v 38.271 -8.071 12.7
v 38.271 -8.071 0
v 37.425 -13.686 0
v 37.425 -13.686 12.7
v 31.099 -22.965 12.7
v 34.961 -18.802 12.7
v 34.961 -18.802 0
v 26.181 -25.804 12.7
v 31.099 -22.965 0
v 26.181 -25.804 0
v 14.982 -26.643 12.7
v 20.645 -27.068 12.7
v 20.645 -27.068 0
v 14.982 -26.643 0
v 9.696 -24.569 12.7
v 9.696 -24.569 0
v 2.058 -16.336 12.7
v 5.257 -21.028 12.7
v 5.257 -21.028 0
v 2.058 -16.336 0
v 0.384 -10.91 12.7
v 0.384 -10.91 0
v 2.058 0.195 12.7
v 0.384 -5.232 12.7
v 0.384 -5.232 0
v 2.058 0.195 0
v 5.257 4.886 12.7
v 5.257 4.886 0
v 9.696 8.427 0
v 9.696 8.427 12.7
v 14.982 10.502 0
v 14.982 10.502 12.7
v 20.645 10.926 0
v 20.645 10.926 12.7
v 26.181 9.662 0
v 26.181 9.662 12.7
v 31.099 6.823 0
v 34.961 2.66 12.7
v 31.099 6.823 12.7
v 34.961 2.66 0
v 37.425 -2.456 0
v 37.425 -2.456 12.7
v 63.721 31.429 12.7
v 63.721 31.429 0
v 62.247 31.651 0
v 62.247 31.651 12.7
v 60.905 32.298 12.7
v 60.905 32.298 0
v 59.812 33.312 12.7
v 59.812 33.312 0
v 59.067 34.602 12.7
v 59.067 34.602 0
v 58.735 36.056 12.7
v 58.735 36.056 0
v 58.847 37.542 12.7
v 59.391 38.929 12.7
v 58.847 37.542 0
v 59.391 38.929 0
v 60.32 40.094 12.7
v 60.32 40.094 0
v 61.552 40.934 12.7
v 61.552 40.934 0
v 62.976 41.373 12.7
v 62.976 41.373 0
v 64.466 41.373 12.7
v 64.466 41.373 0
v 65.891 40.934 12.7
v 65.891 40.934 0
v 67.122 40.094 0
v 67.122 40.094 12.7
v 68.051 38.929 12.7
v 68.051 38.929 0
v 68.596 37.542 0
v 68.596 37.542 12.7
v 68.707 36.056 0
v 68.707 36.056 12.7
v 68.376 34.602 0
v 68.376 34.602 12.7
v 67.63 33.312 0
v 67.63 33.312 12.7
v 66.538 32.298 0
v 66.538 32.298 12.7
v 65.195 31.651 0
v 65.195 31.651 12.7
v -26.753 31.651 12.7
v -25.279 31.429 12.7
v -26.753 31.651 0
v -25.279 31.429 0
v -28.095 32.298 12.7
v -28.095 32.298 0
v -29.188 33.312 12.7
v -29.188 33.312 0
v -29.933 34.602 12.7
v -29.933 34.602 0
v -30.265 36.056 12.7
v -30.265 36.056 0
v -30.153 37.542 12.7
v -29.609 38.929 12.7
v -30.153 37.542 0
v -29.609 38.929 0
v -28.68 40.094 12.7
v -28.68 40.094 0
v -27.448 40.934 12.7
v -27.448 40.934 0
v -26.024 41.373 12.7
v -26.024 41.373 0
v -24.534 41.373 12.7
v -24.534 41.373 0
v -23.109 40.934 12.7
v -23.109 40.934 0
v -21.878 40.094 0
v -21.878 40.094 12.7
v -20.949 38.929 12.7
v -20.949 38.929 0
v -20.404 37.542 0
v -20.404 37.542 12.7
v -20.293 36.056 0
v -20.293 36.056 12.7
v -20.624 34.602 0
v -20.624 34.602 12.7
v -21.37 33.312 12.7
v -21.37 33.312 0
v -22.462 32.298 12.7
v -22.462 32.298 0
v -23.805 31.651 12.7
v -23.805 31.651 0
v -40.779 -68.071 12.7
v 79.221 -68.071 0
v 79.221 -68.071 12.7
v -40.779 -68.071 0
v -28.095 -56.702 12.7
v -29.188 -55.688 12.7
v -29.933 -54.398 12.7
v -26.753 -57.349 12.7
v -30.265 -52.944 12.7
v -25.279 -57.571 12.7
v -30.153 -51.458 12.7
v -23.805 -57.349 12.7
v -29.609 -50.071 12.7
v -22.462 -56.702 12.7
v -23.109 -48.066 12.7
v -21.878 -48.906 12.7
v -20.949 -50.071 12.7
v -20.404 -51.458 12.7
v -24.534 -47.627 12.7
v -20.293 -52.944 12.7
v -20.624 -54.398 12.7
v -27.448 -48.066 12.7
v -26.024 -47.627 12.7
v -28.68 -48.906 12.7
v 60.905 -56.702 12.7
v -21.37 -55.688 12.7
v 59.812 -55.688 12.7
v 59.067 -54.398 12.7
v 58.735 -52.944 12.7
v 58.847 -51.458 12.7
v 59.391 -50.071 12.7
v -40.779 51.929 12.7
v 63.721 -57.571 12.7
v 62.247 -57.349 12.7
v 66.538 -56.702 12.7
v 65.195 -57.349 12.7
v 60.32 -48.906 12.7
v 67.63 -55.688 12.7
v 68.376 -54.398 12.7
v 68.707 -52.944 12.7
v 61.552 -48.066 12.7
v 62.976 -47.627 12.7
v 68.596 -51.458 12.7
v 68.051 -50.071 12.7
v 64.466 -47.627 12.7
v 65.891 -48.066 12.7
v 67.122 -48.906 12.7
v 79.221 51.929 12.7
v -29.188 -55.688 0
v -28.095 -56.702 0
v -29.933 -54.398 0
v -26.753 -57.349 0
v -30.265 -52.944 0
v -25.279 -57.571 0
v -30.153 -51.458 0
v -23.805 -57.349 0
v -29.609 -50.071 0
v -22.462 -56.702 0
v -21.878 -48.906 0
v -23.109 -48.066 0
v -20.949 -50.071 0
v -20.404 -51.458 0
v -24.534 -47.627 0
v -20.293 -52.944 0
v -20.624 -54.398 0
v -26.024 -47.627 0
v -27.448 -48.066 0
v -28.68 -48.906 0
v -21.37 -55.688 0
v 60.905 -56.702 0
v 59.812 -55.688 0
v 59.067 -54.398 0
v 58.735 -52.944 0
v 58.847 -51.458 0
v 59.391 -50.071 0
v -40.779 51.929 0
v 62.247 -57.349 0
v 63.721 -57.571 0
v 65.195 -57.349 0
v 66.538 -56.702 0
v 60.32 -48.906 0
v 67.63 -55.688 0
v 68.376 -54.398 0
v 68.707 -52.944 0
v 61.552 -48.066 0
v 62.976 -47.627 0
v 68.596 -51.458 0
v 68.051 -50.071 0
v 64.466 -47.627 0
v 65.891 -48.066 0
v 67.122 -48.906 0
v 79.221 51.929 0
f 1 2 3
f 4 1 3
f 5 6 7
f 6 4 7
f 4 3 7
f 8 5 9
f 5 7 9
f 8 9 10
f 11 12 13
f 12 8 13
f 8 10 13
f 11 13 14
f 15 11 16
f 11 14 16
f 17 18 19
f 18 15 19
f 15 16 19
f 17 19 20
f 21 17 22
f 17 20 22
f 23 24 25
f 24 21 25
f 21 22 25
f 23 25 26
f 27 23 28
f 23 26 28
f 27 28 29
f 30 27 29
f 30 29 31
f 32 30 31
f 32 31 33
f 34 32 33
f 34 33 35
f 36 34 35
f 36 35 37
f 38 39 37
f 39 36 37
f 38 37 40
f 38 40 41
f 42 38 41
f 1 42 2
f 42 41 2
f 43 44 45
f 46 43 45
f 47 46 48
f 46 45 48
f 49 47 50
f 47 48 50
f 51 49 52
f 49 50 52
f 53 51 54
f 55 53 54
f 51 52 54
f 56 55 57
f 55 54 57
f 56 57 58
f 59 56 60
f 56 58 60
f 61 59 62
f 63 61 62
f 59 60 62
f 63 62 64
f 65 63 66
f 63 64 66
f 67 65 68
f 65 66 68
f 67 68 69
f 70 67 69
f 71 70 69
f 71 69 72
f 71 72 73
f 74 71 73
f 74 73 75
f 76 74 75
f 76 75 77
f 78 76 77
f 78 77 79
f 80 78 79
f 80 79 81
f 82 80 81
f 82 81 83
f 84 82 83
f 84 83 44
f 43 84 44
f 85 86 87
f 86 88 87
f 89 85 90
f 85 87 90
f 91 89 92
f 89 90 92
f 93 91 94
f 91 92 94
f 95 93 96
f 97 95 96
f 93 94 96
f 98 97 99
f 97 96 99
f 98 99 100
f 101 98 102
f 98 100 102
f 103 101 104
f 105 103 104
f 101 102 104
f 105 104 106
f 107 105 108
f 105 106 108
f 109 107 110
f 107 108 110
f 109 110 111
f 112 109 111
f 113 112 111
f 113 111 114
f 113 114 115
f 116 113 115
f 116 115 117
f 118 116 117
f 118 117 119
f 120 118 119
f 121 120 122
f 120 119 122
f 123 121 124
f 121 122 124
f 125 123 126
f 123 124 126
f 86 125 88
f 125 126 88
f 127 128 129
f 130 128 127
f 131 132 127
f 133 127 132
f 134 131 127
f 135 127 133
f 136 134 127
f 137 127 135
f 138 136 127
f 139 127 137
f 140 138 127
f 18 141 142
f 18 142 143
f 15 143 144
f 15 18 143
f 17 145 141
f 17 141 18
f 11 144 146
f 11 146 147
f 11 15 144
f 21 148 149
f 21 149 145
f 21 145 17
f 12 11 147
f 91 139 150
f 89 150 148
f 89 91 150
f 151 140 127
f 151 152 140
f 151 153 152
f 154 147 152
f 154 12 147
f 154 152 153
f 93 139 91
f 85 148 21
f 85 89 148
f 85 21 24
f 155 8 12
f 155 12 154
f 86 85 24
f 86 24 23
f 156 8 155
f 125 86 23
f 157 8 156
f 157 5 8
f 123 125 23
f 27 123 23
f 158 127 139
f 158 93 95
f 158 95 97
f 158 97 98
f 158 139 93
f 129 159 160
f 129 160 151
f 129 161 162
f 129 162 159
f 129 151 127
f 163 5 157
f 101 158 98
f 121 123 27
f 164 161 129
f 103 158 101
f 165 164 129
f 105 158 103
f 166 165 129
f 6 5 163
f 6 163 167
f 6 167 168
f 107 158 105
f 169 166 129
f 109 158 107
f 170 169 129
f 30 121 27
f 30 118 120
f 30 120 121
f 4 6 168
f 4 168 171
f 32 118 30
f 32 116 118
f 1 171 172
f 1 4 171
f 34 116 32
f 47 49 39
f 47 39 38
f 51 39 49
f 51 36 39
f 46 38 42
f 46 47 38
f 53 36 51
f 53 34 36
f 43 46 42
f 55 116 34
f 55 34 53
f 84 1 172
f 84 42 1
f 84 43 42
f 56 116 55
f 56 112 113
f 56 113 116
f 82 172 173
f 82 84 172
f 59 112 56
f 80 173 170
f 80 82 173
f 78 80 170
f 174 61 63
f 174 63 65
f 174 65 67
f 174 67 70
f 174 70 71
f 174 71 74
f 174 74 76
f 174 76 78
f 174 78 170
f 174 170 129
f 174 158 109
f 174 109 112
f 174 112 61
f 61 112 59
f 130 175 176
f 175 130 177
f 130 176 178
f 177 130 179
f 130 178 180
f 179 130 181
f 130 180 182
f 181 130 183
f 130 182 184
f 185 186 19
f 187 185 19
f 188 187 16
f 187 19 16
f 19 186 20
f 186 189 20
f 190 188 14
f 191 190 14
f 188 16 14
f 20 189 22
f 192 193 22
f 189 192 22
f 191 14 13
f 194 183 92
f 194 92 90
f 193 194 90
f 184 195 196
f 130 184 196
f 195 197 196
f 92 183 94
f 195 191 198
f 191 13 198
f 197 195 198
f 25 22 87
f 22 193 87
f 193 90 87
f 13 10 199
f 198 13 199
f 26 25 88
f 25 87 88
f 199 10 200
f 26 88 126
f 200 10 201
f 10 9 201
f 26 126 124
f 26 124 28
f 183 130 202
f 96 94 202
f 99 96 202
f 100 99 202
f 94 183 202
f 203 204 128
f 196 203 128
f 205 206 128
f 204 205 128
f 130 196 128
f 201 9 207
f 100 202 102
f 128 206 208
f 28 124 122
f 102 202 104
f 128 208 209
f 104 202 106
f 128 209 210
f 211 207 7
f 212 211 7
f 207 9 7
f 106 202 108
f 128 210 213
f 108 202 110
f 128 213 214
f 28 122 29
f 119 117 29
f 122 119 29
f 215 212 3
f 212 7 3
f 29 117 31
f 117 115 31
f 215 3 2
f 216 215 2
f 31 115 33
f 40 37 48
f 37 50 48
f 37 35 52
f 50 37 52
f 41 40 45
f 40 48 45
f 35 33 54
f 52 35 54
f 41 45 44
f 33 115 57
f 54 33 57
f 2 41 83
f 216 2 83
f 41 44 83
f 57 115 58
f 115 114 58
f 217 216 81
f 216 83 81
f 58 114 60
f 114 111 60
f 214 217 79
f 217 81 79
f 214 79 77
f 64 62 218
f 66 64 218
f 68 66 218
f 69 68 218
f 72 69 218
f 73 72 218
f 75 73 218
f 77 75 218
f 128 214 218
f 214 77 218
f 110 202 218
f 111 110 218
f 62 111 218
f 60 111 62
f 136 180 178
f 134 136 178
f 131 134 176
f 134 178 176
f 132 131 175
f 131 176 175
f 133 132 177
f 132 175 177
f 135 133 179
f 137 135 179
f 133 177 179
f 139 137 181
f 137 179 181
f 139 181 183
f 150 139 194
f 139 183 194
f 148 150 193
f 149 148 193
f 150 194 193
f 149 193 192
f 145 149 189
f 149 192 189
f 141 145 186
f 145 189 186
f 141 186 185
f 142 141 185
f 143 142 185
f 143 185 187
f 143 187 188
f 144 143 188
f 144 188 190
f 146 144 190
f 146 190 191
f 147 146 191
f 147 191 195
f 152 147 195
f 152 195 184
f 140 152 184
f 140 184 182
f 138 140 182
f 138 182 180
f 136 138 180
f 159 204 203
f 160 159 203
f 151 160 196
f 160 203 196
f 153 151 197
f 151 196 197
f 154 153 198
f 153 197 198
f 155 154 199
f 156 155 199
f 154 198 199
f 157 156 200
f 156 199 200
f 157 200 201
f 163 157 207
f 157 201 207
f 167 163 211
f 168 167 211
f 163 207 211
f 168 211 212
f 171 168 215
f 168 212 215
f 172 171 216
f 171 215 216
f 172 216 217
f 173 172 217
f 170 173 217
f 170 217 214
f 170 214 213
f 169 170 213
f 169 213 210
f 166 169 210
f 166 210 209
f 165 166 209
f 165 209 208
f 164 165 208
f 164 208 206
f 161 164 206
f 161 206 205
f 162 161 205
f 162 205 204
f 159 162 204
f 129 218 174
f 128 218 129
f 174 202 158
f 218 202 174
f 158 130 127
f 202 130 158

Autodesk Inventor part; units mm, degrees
ref_plane "YZ Plane" through (0, 0, 0) normal (1, 0, 0) x (0, 1, 0)
ref_plane "XZ Plane" through (0, 0, 0) normal (0, 1, 0) x (-1, 0, 0)
ref_plane "XY Plane" through (0, 0, 0) normal (0, 0, 1) x (1, 0, 0)
sketch "Sketch1" plane through (0, 0, 0) normal (0, 0, 1) x (1, 0, 0)
  line L0 (-40.7788, 51.9292) -> (79.2212, 51.9292)
  line L1 (79.2212, 51.9292) -> (79.2212, -68.0708)
  line L2 (79.2212, -68.0708) -> (-40.7788, -68.0708)
  line L3 (-40.7788, -68.0708) -> (-40.7788, 51.9292)
  circle A0 centre (19.2212, -8.0708) radius 19.05
  point P0 (0, 0)
  dimension "d0" = 120
  dimension "d1" = 120
  dimension "d2" = 38.1
extrude "Extrusion1" add sketch "Sketch1" along normal blind 12.7
sketch "Sketch2" plane through (0, 0, 12.7) normal (0, 0, 1) x (1, 0, 0)
  line L0 (-40.7788, 51.9292) -> (-40.7788, -68.0708) projected
  line L1 (-40.7788, -8.0708) -> (79.2212, -8.0708)
  line L2 (79.2212, -68.0708) -> (79.2212, 51.9292) projected
  line L3 (79.2212, 51.9292) -> (-40.7788, 51.9292) projected
  line L4 (19.2212, 51.9292) -> (19.2212, -68.0708)
  line L5 (-40.7788, -68.0708) -> (79.2212, -68.0708) projected
  point P0 (0, 0)
  point P1 (-25.2788, 36.4292)
  point P2 (63.7212, 36.4292)
  point P3 (63.7212, -52.5708)
  point P4 (-25.2788, -52.5708)
  dimension "d5" = 89
  dimension "d6" = 89
  dimension "d7" = 89
  dimension "d8" = 89
hole "Hole1" at (-25.2788, 36.4292, 12.7) at (63.7212, 36.4292, 12.7) at (63.7212, -52.5708, 12.7) at (-25.2788, -52.5708, 12.7) direction (0, 0, -1) diameter 10 end through all
properties part number "placa inferior"
